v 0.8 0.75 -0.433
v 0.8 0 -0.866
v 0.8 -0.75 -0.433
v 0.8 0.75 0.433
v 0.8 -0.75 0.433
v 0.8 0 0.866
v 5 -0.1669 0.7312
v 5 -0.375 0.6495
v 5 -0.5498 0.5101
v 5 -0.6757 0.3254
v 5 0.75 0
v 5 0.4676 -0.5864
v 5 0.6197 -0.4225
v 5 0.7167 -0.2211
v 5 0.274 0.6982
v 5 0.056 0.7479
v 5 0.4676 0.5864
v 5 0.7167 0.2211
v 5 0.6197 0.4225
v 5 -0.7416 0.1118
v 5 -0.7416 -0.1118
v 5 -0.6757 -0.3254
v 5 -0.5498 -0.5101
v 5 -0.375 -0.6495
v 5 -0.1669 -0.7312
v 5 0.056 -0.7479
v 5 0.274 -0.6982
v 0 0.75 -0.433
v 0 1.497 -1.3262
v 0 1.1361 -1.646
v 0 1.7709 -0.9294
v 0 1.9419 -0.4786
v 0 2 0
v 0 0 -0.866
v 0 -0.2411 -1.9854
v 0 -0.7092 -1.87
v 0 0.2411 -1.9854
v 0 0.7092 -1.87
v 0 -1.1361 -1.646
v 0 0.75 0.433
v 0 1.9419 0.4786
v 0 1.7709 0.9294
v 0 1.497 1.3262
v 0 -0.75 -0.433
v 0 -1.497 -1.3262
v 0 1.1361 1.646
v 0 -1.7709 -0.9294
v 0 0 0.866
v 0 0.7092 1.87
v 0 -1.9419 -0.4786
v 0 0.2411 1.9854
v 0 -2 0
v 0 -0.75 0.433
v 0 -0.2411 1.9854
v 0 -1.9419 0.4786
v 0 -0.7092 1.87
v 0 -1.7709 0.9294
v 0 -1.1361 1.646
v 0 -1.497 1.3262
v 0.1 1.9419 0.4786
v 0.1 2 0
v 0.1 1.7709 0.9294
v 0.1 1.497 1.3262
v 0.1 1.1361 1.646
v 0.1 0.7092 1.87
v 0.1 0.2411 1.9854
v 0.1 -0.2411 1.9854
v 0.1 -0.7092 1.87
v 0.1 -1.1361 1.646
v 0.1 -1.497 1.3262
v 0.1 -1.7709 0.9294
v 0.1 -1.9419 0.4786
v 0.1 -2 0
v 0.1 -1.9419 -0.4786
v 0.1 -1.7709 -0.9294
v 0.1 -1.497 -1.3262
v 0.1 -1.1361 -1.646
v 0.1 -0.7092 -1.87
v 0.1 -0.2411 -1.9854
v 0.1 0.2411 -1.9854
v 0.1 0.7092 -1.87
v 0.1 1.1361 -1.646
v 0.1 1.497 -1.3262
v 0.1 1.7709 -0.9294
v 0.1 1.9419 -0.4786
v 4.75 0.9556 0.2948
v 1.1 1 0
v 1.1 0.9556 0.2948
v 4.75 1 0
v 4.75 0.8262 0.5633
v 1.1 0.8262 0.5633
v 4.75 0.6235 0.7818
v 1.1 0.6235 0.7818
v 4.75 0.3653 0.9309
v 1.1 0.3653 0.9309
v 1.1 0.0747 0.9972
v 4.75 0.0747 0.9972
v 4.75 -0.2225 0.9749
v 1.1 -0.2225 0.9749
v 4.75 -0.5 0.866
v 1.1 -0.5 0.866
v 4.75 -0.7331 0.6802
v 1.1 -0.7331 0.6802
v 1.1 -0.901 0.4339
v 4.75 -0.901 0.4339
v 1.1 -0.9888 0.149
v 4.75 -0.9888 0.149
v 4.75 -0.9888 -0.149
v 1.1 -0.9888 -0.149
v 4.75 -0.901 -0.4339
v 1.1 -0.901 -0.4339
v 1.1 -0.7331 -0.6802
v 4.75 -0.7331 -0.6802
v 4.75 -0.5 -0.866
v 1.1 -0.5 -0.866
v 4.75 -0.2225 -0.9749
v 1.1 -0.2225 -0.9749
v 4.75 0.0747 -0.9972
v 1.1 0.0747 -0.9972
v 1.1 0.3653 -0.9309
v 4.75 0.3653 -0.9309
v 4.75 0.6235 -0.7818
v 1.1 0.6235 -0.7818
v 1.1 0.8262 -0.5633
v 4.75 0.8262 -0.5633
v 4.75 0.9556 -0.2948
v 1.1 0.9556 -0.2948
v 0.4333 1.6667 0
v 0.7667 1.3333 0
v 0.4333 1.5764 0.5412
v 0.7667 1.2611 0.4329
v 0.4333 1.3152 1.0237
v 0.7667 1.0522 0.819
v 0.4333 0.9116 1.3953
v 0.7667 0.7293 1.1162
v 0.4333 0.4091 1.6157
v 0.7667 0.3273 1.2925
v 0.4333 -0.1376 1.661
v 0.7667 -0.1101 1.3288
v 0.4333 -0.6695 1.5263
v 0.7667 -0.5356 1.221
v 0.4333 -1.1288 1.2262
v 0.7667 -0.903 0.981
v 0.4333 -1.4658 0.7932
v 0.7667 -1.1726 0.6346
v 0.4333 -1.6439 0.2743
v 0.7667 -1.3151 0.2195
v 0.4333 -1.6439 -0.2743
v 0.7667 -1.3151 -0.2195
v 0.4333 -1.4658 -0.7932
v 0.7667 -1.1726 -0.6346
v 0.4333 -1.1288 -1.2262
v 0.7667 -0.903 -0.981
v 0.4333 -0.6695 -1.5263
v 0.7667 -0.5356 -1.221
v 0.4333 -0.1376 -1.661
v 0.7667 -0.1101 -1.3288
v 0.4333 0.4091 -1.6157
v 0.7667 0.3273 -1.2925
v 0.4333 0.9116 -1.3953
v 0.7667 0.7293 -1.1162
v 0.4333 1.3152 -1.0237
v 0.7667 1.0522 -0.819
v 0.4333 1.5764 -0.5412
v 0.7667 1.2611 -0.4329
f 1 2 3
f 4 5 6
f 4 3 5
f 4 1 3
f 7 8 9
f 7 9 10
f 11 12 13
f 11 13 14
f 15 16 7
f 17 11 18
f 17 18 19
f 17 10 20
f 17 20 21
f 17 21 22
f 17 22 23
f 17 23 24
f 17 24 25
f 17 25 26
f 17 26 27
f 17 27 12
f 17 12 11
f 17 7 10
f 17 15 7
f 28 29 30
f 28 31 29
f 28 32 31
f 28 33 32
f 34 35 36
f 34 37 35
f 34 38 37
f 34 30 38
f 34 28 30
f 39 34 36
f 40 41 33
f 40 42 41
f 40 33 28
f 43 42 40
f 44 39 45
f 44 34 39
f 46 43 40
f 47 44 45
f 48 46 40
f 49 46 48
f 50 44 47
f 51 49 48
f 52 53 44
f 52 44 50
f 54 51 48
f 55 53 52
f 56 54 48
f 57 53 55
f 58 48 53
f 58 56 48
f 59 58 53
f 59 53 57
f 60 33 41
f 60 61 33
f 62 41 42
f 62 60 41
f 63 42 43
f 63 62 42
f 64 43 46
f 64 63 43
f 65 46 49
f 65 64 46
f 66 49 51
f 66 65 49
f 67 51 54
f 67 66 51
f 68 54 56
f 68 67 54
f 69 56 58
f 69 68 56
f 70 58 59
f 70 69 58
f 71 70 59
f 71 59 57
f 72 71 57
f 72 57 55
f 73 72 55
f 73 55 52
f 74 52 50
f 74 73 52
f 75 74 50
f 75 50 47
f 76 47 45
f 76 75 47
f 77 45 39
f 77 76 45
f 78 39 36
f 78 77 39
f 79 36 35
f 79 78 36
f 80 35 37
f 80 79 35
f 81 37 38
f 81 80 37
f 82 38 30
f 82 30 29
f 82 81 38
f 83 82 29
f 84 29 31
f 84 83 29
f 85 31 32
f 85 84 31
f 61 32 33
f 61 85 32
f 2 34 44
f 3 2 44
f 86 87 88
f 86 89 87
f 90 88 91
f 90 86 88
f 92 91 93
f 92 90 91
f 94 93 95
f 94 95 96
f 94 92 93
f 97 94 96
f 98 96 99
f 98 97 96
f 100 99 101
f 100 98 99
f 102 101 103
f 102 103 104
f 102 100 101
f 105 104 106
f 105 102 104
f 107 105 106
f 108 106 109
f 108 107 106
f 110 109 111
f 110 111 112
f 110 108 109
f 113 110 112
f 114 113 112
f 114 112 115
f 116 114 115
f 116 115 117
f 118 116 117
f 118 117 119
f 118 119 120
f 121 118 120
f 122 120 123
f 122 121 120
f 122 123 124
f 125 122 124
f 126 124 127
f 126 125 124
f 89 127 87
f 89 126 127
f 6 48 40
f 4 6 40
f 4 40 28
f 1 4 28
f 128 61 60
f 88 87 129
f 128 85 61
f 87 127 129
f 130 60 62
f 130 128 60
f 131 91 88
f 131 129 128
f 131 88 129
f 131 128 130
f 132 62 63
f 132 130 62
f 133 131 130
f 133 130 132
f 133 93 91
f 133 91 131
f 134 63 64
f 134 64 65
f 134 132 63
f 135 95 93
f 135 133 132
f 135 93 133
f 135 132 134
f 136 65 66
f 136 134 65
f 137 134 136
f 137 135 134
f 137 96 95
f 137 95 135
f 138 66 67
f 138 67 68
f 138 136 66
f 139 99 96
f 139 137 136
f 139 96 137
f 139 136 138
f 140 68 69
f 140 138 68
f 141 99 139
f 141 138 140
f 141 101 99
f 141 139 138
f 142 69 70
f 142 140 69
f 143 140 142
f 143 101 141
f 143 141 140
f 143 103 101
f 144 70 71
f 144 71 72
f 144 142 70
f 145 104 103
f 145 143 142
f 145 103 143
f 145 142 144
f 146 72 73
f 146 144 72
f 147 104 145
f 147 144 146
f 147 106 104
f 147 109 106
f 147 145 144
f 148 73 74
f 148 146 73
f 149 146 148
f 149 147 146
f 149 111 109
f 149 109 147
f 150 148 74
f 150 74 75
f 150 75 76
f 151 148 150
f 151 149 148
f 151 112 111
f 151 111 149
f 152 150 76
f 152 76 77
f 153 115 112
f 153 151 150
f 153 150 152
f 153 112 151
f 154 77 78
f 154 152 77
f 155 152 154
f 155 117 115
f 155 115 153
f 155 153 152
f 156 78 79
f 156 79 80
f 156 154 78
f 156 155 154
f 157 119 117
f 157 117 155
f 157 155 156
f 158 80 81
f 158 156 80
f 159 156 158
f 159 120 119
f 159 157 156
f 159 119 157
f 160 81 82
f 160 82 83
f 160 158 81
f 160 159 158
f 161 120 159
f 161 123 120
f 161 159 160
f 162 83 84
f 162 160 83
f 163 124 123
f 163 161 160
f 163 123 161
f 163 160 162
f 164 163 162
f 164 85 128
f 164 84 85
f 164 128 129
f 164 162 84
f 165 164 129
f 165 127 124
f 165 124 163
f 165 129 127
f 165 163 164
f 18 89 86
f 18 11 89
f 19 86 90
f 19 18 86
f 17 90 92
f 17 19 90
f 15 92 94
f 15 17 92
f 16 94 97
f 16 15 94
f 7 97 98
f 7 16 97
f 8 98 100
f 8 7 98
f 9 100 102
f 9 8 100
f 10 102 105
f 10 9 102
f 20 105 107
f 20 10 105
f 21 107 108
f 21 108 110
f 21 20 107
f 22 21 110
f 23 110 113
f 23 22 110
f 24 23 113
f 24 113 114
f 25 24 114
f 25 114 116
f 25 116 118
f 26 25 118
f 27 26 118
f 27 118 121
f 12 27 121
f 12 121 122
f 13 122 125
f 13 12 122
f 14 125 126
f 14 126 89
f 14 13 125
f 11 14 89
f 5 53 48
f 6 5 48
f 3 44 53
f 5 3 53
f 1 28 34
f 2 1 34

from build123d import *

# Parameters (mm, degrees)
CUT_EXTRUDE1_DEPTH = 0.8


with BuildPart() as part:
    # Sketch2 → Revolve1 (revolve)
    with BuildSketch(Plane.XY):
        Polygon((0, 0), (0, 2), (0.1, 2), (1.1, 1), (4.75, 1), (5, 0.75), (5, 0), align=None)
    revolve(axis=Axis((-2.281841559, 0, 0), (1, 0, 0)))

    # Sketch3 → Cut-Extrude1 (cut)
    with BuildSketch(Plane.ZY):
        Polygon((0.433012702, -0.75), (0.866025404, 0), (0.433012702, 0.75), (-0.433012702, 0.75), (-0.866025404, 0), (-0.433012702, -0.75), align=None)
    extrude(amount=-CUT_EXTRUDE1_DEPTH, mode=Mode.SUBTRACT)


solid = part.part
